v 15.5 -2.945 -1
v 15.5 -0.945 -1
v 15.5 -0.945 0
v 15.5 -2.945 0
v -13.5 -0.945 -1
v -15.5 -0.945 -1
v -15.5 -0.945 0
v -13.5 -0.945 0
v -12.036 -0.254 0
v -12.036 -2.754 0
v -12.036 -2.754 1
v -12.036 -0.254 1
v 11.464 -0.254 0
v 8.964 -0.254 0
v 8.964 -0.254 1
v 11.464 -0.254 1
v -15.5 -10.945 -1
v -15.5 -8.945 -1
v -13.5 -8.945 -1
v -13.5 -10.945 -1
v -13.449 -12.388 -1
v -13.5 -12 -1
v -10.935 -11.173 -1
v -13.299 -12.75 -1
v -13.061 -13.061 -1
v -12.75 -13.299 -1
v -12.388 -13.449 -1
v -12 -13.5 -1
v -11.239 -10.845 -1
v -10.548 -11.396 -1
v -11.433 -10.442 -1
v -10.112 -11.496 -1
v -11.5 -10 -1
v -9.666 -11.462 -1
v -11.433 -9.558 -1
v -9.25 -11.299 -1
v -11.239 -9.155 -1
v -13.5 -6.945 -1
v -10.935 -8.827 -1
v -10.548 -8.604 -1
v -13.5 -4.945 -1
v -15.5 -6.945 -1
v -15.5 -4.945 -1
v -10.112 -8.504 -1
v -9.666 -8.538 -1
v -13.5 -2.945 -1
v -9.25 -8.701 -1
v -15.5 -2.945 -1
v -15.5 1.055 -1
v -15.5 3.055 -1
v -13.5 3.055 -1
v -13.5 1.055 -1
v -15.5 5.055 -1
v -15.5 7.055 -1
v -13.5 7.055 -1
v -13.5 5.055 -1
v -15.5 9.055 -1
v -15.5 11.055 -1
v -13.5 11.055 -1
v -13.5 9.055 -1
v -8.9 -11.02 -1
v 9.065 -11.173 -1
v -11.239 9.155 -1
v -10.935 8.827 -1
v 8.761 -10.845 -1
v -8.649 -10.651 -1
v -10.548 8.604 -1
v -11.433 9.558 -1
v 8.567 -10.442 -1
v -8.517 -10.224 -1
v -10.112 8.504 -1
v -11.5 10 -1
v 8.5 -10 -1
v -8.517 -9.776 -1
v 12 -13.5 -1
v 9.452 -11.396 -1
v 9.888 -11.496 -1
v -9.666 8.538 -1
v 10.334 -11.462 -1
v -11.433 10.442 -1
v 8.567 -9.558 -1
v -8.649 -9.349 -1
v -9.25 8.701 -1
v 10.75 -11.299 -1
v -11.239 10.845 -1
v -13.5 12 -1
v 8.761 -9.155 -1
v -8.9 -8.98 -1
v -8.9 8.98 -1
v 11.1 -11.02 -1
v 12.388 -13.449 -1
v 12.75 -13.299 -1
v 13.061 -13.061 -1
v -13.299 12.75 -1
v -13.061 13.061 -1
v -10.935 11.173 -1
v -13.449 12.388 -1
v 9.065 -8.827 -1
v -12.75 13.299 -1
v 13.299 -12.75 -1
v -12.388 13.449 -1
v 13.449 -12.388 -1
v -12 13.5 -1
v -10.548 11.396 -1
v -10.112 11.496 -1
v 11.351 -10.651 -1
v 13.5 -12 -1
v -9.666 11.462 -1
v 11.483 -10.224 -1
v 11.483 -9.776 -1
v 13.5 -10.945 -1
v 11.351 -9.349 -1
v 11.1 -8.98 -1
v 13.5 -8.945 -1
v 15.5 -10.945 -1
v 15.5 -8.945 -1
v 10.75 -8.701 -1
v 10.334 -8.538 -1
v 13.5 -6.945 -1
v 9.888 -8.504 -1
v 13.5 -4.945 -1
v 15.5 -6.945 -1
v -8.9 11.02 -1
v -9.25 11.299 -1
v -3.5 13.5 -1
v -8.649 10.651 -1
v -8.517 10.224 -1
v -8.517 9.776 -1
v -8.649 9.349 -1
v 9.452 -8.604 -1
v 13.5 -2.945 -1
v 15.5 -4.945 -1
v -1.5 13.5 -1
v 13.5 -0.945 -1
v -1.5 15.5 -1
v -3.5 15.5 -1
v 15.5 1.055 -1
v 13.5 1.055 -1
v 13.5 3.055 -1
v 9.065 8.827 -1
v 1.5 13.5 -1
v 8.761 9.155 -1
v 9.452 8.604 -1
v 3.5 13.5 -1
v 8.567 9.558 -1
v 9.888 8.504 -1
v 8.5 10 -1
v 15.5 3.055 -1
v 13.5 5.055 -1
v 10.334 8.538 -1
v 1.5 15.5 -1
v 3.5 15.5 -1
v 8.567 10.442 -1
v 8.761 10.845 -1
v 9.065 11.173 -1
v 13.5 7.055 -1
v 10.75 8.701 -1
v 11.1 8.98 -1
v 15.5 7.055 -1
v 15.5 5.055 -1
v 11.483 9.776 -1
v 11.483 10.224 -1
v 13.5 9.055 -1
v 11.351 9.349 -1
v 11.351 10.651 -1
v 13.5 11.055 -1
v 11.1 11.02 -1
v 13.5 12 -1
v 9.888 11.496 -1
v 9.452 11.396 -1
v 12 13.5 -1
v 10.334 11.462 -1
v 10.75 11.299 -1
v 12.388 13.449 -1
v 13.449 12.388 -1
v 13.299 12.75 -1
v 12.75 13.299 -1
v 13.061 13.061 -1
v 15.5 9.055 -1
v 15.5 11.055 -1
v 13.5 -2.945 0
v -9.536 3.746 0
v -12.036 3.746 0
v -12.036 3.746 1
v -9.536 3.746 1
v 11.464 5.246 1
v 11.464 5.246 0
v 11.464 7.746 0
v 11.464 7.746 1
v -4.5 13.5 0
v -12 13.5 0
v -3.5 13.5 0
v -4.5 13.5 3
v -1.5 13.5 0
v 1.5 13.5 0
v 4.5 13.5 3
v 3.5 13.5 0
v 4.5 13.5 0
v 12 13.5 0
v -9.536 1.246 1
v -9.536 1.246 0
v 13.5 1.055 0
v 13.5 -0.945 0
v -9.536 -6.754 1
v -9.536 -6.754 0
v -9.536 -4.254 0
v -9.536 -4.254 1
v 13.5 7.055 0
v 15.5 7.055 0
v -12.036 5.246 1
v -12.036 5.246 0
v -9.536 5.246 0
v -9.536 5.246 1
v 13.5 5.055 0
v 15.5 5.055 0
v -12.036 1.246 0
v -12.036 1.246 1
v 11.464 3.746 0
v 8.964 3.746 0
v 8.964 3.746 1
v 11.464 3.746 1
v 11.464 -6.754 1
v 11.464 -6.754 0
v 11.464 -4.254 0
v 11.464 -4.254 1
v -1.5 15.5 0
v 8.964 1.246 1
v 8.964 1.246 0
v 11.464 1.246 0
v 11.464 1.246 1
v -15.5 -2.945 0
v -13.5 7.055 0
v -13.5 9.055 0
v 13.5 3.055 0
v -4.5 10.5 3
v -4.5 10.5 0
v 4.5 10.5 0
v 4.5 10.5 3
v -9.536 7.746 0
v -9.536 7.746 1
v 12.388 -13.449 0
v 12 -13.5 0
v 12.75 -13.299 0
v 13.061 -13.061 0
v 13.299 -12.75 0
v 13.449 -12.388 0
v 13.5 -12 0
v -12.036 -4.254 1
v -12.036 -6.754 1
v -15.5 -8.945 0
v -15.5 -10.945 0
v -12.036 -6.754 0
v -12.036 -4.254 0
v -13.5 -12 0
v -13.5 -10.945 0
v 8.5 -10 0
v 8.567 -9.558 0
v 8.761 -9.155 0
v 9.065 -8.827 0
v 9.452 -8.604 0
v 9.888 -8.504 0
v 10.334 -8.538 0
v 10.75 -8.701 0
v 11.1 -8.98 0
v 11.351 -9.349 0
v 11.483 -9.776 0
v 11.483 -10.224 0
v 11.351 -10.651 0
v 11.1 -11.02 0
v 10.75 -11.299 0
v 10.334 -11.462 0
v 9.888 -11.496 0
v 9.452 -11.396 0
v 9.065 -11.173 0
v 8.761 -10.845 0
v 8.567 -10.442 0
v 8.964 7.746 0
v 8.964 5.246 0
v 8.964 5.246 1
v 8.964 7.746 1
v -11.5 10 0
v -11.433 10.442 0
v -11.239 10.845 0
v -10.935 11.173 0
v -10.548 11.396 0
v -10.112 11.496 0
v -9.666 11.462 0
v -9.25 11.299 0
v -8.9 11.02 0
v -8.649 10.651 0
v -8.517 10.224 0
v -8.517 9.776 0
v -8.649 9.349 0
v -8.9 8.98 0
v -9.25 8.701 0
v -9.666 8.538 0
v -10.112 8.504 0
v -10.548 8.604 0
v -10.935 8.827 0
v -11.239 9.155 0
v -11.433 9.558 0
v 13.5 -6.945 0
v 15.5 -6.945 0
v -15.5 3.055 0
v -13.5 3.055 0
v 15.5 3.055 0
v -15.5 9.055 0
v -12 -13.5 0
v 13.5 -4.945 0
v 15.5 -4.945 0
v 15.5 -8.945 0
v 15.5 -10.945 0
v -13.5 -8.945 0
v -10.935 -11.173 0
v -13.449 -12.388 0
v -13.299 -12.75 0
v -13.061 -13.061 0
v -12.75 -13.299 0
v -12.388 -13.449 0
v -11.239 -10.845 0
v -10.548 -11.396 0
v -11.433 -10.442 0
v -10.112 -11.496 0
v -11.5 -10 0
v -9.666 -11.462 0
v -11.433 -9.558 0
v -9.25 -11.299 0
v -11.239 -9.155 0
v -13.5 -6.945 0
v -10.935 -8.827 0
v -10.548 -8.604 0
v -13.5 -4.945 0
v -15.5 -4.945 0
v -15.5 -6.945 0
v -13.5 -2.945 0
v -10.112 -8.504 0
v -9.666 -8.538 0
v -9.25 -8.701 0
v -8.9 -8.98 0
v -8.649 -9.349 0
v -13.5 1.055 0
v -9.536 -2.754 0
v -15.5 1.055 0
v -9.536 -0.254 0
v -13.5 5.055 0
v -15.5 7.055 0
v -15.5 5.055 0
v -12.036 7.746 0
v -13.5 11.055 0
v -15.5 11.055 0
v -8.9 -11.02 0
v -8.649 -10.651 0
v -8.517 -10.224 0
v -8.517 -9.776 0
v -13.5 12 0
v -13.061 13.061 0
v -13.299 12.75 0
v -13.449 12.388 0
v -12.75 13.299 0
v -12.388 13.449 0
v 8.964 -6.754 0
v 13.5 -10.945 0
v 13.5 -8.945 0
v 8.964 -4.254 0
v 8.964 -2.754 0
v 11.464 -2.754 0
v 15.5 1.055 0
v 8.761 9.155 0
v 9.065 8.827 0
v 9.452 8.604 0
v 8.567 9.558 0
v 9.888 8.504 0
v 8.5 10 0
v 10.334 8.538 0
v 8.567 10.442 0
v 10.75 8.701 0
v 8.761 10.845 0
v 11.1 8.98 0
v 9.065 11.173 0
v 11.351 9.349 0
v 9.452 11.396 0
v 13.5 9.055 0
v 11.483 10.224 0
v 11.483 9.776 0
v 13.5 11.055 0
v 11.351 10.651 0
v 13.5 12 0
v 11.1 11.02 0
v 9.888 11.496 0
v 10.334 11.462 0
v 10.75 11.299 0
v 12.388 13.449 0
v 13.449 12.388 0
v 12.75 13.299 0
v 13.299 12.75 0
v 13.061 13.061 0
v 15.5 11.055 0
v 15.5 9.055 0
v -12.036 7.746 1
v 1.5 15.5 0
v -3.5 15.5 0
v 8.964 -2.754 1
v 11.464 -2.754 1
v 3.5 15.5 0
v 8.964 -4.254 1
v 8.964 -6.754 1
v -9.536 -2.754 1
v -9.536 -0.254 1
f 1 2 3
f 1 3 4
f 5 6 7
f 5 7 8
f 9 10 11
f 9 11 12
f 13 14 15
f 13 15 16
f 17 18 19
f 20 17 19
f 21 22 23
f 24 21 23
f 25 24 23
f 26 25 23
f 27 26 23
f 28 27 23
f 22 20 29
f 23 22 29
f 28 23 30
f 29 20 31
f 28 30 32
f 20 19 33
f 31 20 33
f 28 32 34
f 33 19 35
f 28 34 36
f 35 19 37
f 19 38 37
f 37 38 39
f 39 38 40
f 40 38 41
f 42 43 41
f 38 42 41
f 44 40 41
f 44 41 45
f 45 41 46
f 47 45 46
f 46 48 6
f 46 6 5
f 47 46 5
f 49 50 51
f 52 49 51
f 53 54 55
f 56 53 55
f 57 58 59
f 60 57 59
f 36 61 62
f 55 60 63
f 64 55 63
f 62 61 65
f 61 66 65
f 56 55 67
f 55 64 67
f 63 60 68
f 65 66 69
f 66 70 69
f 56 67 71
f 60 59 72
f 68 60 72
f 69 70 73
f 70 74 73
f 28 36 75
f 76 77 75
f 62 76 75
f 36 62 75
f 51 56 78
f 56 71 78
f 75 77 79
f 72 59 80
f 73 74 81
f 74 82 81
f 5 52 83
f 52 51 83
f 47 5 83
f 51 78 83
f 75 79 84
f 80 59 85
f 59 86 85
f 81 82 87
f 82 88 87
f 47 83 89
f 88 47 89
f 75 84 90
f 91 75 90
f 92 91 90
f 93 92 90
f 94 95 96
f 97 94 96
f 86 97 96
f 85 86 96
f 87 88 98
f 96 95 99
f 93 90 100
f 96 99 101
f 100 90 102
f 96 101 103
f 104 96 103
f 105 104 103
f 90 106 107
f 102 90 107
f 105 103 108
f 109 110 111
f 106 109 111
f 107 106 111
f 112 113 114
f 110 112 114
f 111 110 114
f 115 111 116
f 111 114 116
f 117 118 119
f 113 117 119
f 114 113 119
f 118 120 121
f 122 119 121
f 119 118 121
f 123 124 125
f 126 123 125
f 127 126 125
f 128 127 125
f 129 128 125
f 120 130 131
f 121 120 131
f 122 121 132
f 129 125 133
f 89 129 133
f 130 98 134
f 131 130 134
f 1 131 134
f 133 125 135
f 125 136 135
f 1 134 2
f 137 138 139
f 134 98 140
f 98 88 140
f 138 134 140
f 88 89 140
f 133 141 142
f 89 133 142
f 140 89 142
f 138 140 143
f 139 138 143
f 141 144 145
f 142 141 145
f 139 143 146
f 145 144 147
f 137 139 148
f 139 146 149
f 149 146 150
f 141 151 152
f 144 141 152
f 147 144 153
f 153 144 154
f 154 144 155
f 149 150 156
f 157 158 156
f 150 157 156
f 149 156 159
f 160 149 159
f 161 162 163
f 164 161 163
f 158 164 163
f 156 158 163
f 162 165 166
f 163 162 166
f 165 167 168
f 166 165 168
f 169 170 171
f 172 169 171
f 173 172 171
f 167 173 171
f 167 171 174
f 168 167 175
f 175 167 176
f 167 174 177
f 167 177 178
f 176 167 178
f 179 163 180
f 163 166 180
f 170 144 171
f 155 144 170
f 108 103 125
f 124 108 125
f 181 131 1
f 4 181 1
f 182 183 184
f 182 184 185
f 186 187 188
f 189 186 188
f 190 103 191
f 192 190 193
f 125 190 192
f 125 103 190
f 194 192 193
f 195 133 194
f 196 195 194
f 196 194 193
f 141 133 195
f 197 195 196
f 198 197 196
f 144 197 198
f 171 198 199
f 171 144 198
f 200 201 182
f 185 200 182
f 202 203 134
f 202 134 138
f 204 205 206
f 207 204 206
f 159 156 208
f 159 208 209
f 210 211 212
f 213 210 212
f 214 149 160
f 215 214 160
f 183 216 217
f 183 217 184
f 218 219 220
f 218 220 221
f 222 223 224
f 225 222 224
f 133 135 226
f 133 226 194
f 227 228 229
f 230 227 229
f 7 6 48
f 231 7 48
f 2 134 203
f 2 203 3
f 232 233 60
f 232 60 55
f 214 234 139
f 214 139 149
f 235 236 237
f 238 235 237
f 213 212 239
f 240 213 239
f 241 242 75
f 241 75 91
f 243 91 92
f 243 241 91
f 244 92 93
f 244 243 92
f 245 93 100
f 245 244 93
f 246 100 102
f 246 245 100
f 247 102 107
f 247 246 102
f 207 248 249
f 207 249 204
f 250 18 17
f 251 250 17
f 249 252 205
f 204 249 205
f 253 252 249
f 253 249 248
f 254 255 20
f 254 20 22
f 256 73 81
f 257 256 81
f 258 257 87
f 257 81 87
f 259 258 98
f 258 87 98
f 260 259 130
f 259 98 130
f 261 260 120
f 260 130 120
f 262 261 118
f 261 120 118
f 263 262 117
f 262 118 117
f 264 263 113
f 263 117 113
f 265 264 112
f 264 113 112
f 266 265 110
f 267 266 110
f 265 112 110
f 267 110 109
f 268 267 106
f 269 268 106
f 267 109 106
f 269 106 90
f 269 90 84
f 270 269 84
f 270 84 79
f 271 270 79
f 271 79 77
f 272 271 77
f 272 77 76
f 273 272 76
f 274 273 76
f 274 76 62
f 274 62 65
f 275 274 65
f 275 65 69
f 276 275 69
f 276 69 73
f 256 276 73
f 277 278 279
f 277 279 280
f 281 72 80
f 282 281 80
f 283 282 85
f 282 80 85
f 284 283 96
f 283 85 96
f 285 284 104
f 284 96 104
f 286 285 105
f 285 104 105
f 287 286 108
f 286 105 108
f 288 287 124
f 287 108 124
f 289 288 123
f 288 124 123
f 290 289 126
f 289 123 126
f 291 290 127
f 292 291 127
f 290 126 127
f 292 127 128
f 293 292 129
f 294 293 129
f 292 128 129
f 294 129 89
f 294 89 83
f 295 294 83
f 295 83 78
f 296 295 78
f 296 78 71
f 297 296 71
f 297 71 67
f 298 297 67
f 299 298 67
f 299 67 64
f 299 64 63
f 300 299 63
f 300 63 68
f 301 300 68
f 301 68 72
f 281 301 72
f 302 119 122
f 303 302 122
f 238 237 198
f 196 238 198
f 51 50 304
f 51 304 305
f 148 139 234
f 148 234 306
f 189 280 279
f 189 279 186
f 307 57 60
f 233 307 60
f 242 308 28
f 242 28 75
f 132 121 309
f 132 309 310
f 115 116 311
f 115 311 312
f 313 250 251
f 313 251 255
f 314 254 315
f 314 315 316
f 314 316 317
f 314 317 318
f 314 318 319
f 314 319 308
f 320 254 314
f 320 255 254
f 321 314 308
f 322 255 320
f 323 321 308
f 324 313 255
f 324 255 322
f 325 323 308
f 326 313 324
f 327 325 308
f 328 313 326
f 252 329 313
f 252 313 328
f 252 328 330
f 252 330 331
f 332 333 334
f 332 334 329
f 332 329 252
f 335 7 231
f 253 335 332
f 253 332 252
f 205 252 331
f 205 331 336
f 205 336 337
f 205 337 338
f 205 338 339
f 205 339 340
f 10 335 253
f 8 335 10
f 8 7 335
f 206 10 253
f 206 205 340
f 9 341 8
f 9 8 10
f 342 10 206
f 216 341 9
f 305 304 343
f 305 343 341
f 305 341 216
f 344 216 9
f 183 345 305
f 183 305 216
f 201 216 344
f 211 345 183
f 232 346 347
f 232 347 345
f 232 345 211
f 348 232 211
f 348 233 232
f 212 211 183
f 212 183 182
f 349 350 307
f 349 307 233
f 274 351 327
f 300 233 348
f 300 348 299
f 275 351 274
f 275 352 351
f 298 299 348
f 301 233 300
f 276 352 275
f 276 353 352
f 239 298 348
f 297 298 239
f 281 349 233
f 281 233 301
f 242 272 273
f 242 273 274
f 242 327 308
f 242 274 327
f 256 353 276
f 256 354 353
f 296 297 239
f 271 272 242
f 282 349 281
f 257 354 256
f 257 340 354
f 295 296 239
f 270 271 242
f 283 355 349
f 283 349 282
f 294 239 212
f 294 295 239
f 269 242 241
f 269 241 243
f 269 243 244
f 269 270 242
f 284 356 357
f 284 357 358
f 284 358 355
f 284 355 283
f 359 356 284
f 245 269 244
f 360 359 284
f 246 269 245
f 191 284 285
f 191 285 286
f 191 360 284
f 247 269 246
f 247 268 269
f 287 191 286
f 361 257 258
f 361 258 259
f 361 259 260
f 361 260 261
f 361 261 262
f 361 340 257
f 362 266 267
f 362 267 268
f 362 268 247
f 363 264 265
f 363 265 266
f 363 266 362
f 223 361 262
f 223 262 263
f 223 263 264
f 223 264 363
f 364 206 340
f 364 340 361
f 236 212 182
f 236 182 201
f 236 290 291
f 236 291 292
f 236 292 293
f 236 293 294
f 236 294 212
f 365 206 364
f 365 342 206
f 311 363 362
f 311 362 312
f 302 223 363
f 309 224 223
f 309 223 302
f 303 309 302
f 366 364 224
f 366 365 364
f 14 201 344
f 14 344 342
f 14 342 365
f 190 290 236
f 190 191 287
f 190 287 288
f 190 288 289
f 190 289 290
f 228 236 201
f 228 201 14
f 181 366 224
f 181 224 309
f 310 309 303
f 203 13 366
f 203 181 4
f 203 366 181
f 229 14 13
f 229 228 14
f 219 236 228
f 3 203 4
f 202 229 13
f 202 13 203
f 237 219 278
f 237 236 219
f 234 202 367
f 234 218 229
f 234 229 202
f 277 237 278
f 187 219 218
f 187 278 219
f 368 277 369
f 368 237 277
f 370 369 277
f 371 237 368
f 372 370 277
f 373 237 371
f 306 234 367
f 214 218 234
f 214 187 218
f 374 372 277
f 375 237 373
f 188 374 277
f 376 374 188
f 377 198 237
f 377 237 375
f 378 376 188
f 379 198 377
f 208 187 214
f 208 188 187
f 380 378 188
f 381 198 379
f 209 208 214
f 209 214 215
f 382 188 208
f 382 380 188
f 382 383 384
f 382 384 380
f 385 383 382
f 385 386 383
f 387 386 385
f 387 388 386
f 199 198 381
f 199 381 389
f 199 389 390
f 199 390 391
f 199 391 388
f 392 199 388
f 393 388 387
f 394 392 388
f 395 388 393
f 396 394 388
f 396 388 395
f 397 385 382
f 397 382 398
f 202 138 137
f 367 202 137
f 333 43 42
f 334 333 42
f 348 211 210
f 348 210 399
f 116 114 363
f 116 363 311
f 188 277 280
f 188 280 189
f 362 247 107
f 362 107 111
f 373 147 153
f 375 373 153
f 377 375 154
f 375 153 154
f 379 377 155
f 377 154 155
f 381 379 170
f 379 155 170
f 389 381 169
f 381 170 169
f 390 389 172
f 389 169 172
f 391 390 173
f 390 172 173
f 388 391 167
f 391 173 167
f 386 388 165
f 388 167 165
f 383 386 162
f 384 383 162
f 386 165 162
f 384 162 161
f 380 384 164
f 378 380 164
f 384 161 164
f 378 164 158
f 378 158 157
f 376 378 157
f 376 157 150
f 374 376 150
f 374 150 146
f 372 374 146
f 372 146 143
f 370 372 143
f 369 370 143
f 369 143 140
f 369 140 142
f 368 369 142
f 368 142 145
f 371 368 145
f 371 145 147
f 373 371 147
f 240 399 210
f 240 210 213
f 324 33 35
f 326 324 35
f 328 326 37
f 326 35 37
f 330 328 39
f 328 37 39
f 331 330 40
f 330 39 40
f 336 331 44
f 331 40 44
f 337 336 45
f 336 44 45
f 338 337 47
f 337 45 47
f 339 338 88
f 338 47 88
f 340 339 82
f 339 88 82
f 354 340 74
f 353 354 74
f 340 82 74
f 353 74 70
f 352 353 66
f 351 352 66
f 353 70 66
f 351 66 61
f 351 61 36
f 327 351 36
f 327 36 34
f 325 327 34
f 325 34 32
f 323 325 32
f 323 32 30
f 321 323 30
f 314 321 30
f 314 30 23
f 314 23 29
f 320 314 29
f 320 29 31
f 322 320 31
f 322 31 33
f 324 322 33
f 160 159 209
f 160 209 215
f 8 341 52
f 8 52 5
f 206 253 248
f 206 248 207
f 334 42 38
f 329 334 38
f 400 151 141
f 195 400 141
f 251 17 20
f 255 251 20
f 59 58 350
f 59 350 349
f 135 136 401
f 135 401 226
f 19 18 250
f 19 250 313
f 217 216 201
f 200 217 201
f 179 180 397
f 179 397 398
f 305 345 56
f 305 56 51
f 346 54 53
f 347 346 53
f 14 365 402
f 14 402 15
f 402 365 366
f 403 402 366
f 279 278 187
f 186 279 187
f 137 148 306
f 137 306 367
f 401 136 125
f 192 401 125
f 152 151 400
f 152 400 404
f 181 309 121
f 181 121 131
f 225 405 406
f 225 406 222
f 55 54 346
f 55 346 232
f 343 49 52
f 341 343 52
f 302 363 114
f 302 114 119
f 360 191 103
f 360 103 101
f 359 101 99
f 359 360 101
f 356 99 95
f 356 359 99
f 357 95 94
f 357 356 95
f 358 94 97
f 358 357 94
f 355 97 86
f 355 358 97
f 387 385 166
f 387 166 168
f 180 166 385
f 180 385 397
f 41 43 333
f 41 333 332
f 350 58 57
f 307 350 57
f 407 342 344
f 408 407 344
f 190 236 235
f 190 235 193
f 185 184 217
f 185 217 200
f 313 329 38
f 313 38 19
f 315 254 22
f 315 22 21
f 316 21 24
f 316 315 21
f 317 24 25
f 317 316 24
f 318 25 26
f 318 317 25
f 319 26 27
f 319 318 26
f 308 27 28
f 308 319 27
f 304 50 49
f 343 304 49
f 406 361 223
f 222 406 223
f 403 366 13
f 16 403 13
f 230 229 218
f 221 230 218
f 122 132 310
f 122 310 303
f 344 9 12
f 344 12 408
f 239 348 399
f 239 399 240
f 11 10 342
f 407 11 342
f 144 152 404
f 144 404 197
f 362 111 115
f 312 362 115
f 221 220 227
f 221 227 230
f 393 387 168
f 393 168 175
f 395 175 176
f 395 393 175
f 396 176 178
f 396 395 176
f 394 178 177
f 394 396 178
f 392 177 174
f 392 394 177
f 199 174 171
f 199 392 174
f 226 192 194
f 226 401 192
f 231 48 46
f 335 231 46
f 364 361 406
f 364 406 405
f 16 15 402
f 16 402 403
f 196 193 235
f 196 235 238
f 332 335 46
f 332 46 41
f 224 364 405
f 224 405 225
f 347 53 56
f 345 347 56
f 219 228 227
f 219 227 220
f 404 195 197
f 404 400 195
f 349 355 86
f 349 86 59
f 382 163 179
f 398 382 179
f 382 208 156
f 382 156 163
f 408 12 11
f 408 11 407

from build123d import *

# Parameters (mm, degrees)
F1_DEPTH = 1
F2_D     = 3
F2_DEPTH = 5
F2_TIP   = 0.9012909285
F3_W     = 2
F3_H     = 2
F4_DEPTH = 1
F5_W     = 9
F5_H     = 3
F6_DEPTH = 3
F7_W     = 2.5
F7_H     = 2.5
F8_DEPTH = 1


with BuildPart() as f1:
    # F0 (on Top) → F1 (new body)
    with BuildSketch(Plane.XY):
        with BuildLine():
            Line((12, 13.5), (-12, 13.5))
            ThreePointArc((-12, 13.5), (-13.0606601718, 13.0606601718), (-13.5, 12))
            Line((-13.5, 12), (-13.5, -12))
            ThreePointArc((-13.5, -12), (-13.0606601718, -13.0606601718), (-12, -13.5))
            Line((-12, -13.5), (12, -13.5))
            ThreePointArc((12, -13.5), (13.0606601718, -13.0606601718), (13.5, -12))
            Line((13.5, -12), (13.5, 12))
            ThreePointArc((13.5, 12), (13.0606601718, 13.0606601718), (12, 13.5))
        make_face()
    extrude(amount=-F1_DEPTH)

    # F2
    with Locations(Plane.XY):
        with Locations((-10, 10), (10, 10), (10, -10), (-10, -10)):
            Hole(F2_D / 2, depth=F2_DEPTH)
            with Locations((0, 0, -(F2_DEPTH + F2_TIP / 2))):  # 118° drill point
                Cone(0, F2_D / 2, F2_TIP, mode=Mode.SUBTRACT)

    # F3 (on face) → F4 (join)
    with BuildSketch(Plane(origin=(0, 0, -1), x_dir=(1, 0, 0), z_dir=(0, 0, -1))):
        with Locations((-14.5, 9.9446508034)):
            Rectangle(F3_W, F3_H)
        with Locations((-14.5, 5.9446508034)):
            Rectangle(F3_W, F3_H)
        with Locations((-14.5, 1.9446508034)):
            Rectangle(F3_W, F3_H)
        with Locations((-14.5, -2.0553491966)):
            Rectangle(F3_W, F3_H)
        with Locations((-14.5, -6.0553491966)):
            Rectangle(F3_W, F3_H)
        with Locations((-14.5, -10.0553491966)):
            Rectangle(F3_W, F3_H)
        with Locations((14.5, 9.9446508034)):
            Rectangle(F3_W, F3_H)
        with Locations((14.5, 5.9446508034)):
            Rectangle(F3_W, F3_H)
        with Locations((14.5, 1.9446508034)):
            Rectangle(F3_W, F3_H)
        with Locations((14.5, -2.0553491966)):
            Rectangle(F3_W, F3_H)
        with Locations((14.5, -6.0553491966)):
            Rectangle(F3_W, F3_H)
        with Locations((14.5, -10.0553491966)):
            Rectangle(F3_W, F3_H)
        with Locations((-2.5, -14.5)):
            Rectangle(F3_W, F3_H)
        with Locations((2.5, -14.5)):
            Rectangle(F3_W, F3_H)
    extrude(amount=-F4_DEPTH)

    # F5 (on face) → F6 (join)
    with BuildSketch(Plane.XY):
        with Locations((0, 12)):
            Rectangle(F5_W, F5_H)
    extrude(amount=F6_DEPTH)

    # F7 (on face) → F8 (join)
    with BuildSketch(Plane.XY):
        with Locations((-10.7858264819, 2.4961141907)):
            Rectangle(F7_W, F7_H)
        with Locations((-10.7858264819, -1.5038858093)):
            Rectangle(F7_W, F7_H)
        with Locations((-10.7858264819, -5.5038858093)):
            Rectangle(F7_W, F7_H)
        with Locations((-10.7858264819, 6.4961141907)):
            Rectangle(F7_W, F7_H)
        with Locations((10.2141735181, 6.4961141907)):
            Rectangle(F7_W, F7_H)
        with Locations((10.2141735181, 2.4961141907)):
            Rectangle(F7_W, F7_H)
        with Locations((10.2141735181, -1.5038858093)):
            Rectangle(F7_W, F7_H)
        with Locations((10.2141735181, -5.5038858093)):
            Rectangle(F7_W, F7_H)
    extrude(amount=F8_DEPTH)


solid = f1.part
